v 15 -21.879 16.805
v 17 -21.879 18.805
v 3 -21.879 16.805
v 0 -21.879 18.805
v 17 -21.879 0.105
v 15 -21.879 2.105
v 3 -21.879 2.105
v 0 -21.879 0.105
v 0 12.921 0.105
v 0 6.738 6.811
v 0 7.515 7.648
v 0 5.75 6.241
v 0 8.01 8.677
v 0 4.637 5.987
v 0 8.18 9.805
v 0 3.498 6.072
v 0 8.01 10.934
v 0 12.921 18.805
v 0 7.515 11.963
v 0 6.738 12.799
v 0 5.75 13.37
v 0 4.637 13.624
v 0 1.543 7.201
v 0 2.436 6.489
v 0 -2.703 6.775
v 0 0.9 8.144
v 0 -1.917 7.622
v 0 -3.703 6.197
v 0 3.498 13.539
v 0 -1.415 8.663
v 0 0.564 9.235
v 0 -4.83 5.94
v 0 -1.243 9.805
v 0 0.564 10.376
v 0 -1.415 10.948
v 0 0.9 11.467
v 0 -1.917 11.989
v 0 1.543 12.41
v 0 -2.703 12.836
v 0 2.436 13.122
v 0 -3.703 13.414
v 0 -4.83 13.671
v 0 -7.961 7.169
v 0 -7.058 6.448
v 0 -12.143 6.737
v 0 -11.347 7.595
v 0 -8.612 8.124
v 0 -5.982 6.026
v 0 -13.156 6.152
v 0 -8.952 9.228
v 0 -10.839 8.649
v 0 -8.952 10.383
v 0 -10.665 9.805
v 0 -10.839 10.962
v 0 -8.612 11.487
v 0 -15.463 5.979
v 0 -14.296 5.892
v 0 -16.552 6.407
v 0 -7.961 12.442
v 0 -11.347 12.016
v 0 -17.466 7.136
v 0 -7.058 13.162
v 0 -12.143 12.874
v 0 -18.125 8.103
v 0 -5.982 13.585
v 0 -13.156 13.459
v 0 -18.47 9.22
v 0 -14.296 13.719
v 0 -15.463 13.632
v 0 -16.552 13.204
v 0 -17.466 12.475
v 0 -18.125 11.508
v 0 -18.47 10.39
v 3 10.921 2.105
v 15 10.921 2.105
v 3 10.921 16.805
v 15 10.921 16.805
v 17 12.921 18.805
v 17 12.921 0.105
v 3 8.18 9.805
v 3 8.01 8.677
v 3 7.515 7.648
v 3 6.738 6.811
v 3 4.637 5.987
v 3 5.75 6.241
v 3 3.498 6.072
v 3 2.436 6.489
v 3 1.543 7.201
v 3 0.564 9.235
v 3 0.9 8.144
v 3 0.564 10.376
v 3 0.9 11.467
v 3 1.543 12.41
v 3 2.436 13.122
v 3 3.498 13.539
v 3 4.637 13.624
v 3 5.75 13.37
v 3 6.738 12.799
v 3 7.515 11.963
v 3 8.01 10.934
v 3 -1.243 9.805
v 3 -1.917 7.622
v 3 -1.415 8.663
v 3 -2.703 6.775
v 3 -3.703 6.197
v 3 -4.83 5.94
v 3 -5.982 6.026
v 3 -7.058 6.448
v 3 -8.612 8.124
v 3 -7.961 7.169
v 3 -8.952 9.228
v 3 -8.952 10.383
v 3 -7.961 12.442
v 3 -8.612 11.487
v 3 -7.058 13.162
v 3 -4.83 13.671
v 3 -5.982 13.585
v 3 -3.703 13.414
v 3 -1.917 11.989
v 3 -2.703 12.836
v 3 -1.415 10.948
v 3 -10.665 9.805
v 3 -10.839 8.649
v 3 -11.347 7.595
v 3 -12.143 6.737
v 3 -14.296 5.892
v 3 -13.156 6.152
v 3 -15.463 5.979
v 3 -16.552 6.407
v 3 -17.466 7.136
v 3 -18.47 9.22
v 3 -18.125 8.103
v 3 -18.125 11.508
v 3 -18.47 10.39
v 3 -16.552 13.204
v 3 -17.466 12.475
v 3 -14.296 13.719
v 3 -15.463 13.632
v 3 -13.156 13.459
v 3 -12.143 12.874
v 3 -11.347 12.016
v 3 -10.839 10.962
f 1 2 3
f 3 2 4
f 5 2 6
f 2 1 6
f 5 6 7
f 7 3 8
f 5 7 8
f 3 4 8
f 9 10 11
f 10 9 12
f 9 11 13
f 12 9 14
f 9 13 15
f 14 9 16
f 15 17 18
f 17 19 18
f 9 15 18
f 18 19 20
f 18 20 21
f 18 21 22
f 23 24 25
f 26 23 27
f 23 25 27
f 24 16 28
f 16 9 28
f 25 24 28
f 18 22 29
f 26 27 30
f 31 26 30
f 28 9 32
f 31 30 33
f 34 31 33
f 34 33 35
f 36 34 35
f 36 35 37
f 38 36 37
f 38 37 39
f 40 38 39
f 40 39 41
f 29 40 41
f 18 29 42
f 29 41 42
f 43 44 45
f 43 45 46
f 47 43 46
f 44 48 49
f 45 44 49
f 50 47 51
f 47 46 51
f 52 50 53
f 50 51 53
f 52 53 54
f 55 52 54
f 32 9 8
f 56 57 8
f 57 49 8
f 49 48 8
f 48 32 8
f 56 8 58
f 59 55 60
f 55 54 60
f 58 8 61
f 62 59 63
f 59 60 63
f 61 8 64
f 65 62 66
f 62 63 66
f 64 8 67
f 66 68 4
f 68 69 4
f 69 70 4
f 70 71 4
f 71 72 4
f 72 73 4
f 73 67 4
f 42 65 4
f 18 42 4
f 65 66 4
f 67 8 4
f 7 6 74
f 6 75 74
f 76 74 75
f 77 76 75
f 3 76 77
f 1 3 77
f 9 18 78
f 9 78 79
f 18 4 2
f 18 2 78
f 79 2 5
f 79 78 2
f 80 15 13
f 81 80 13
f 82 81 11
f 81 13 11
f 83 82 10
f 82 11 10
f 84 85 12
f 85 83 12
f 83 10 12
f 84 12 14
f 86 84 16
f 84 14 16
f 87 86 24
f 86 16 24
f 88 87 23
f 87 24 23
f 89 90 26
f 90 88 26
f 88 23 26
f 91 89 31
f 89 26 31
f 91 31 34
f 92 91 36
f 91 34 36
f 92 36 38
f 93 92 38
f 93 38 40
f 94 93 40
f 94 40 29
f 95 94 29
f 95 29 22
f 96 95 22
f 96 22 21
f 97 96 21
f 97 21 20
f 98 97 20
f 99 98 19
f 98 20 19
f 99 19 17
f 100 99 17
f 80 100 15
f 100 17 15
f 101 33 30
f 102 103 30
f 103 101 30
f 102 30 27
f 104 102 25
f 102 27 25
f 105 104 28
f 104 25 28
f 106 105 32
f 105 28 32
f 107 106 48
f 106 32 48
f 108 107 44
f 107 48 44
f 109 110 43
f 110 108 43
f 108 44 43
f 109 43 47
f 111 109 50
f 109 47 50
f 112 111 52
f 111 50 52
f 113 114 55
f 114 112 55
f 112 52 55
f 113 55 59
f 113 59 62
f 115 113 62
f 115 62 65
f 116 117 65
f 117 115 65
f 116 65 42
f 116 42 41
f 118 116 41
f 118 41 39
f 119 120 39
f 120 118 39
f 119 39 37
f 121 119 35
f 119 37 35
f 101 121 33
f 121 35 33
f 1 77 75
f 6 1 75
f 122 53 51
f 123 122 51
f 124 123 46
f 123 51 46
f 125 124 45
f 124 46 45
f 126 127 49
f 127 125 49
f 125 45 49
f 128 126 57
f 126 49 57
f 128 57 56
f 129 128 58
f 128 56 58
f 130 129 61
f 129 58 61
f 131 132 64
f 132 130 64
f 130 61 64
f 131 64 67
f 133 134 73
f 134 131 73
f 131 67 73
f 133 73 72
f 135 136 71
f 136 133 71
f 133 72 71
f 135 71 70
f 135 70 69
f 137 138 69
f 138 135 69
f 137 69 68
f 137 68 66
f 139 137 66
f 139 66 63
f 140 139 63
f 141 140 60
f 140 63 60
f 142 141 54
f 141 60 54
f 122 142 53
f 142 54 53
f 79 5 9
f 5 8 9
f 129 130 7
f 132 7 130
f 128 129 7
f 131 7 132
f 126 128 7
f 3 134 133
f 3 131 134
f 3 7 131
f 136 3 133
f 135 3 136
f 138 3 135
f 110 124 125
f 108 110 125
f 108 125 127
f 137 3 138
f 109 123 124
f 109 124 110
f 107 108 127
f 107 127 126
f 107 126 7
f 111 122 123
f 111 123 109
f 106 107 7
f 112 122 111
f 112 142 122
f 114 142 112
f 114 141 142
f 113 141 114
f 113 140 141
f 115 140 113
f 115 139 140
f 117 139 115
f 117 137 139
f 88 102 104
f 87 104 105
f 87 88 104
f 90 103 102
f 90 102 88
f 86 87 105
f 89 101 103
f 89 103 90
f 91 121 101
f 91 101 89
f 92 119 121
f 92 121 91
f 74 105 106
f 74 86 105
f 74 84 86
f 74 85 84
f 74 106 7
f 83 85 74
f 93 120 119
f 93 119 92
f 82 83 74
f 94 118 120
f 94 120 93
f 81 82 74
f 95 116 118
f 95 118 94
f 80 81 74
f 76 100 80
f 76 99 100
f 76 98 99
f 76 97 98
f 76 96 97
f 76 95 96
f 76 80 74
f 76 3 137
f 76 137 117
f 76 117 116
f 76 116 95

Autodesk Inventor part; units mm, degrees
ref_plane "YZ Plane" through (0, 0, 0) normal (1, 0, 0) x (0, 1, 0)
ref_plane "XZ Plane" through (0, 0, 0) normal (0, 1, 0) x (-1, 0, 0)
ref_plane "XY Plane" through (0, 0, 0) normal (0, 0, 1) x (1, 0, 0)
sketch "Esboço1" plane through (0, 0, 0) normal (1, 0, 0) x (0, 1, 0)
  line L0 (10.9206, 18.8054) -> (-21.8794, 18.8054)
  line L1 (-21.8794, 18.8054) -> (-21.8794, 2.1054)
  line L2 (-21.8794, 2.1054) -> (10.9206, 2.1054)
  line L3 (10.9206, 2.1054) -> (10.9206, 18.8054)
  circle A0 centre (4.3506, 9.8054) radius 3.25
  circle A1 centre (4.3506, 9.8054) radius 3.8294
  circle A2 centre (-5.1194, 9.8054) radius 3.25
  circle A3 centre (-5.1194, 9.8054) radius 3.8763
  circle A4 centre (-14.5894, 9.8054) radius 3.25
  circle A5 centre (-14.5894, 9.8054) radius 3.9245
  point P0 (0, 0)
  point P1 (-5.4794, 18.8054)
  dimension "d0" = 32.8
  dimension "d1" = 16.7
  dimension "d2" = 32.8
  dimension "d7" = 6.5
  dimension "d8" = 6.5
  dimension "d9" = 6.5
  dimension "d22" = 9
  dimension "d23" = 9
  dimension "d24" = 9
extrude "Extrusão1" add sketch "Esboço1" along normal blind 3 contours L3 L2 L1 L0
sketch "Esboço2" plane through (0, -21.8794, 18.8054) normal (0, 0, 1) x (1, 0, 0)
  line L0 (3, 0) -> (3, 32.8) projected
  line L1 (0, 32.8) -> (3, 32.8) projected
  line L2 (3, 32.8) -> (15, 32.8)
  line L3 (15, 32.8) -> (15, 0)
  line L4 (15, 0) -> (3, 0)
  point P0 (0, 21.8794)
  dimension "d13" = 12
extrude "Extrusão2" add sketch "Esboço2" against normal blind 2
sketch "Esboço3" plane through (0, -21.8794, 16.8054) normal (0, 0, -1) x (-1, 0, 0)
  line L0 (0, 32.8) -> (-3, 32.8) projected
  line L1 (0, 32.8) -> (-15, 32.8) projected
  line L2 (-3, 32.8) -> (-15, 32.8)
  line L3 (-15, 32.8) -> (-15, 0.0164)
  line L4 (-15, 0.0164) -> (-3, 0.0164)
  point P0 (0, 21.8794)
sketch "Esboço4" plane through (0, -21.8794, 2.1054) normal (0, 0, -1) x (-1, 0, 0)
  line L0 (0, 32.8) -> (-3, 32.8) projected
  line L1 (0, 32.8) -> (-15, 32.8)
  line L2 (-15, 32.8) -> (-15, 0) projected
  line L3 (-15, 32.8) -> (-15, 0)
  line L4 (-15, 0) -> (0, 0)
  line L5 (0, 32.8) -> (0, 0) projected
  line L6 (0, 0) -> (0, 32.8)
  point P0 (0, 21.8794)
extrude "Extrusão3" add sketch "Esboço4" along normal blind 2
sketch "Esboço5" plane through (0, 10.9206, 18.8054) normal (0, 1, 0) x (1, 0, 0)
  line L0 (0, 0) -> (15, 0) projected
  line L1 (15, 18.7) -> (0, 18.7) projected
  line L2 (15, 0) -> (15, 18.7)
  line L3 (15, 18.7) -> (0, 18.8054)
  line L4 (0, 18.8054) -> (0, 0)
  line L5 (0, 0) -> (15, 0)
  point P0 (0, 18.7)
extrude "Extrusão4" add sketch "Esboço5" along normal blind 2 contours L4 L1 L2 L0
sketch "Esboço6" plane through (15, -21.8794, 18.8054) normal (1, 0, 0) x (0, 0, -1)
  line L0 (0, 34.8) -> (18.7, 34.8) projected
  line L1 (0, 0) -> (0, 34.8) projected
  line L2 (0, 34.8) -> (0, 0)
  line L3 (0, 0) -> (18.7, 0)
  line L4 (18.7, 0) -> (18.7, 34.8) projected
  line L5 (18.7, 0) -> (18.7, 34.8)
  line L6 (18.7, 34.8) -> (0, 34.8)
  point P0 (18.8054, 21.8794)
extrude "Extrusão5" add sketch "Esboço6" along normal blind 2
sketch "Esboço7" plane through (0, -21.8794, 18.8054) normal (0, 0, 1) x (1, 0, 0)
  point P0 (0, 21.8794)
properties part number "semaforoEsboço"
